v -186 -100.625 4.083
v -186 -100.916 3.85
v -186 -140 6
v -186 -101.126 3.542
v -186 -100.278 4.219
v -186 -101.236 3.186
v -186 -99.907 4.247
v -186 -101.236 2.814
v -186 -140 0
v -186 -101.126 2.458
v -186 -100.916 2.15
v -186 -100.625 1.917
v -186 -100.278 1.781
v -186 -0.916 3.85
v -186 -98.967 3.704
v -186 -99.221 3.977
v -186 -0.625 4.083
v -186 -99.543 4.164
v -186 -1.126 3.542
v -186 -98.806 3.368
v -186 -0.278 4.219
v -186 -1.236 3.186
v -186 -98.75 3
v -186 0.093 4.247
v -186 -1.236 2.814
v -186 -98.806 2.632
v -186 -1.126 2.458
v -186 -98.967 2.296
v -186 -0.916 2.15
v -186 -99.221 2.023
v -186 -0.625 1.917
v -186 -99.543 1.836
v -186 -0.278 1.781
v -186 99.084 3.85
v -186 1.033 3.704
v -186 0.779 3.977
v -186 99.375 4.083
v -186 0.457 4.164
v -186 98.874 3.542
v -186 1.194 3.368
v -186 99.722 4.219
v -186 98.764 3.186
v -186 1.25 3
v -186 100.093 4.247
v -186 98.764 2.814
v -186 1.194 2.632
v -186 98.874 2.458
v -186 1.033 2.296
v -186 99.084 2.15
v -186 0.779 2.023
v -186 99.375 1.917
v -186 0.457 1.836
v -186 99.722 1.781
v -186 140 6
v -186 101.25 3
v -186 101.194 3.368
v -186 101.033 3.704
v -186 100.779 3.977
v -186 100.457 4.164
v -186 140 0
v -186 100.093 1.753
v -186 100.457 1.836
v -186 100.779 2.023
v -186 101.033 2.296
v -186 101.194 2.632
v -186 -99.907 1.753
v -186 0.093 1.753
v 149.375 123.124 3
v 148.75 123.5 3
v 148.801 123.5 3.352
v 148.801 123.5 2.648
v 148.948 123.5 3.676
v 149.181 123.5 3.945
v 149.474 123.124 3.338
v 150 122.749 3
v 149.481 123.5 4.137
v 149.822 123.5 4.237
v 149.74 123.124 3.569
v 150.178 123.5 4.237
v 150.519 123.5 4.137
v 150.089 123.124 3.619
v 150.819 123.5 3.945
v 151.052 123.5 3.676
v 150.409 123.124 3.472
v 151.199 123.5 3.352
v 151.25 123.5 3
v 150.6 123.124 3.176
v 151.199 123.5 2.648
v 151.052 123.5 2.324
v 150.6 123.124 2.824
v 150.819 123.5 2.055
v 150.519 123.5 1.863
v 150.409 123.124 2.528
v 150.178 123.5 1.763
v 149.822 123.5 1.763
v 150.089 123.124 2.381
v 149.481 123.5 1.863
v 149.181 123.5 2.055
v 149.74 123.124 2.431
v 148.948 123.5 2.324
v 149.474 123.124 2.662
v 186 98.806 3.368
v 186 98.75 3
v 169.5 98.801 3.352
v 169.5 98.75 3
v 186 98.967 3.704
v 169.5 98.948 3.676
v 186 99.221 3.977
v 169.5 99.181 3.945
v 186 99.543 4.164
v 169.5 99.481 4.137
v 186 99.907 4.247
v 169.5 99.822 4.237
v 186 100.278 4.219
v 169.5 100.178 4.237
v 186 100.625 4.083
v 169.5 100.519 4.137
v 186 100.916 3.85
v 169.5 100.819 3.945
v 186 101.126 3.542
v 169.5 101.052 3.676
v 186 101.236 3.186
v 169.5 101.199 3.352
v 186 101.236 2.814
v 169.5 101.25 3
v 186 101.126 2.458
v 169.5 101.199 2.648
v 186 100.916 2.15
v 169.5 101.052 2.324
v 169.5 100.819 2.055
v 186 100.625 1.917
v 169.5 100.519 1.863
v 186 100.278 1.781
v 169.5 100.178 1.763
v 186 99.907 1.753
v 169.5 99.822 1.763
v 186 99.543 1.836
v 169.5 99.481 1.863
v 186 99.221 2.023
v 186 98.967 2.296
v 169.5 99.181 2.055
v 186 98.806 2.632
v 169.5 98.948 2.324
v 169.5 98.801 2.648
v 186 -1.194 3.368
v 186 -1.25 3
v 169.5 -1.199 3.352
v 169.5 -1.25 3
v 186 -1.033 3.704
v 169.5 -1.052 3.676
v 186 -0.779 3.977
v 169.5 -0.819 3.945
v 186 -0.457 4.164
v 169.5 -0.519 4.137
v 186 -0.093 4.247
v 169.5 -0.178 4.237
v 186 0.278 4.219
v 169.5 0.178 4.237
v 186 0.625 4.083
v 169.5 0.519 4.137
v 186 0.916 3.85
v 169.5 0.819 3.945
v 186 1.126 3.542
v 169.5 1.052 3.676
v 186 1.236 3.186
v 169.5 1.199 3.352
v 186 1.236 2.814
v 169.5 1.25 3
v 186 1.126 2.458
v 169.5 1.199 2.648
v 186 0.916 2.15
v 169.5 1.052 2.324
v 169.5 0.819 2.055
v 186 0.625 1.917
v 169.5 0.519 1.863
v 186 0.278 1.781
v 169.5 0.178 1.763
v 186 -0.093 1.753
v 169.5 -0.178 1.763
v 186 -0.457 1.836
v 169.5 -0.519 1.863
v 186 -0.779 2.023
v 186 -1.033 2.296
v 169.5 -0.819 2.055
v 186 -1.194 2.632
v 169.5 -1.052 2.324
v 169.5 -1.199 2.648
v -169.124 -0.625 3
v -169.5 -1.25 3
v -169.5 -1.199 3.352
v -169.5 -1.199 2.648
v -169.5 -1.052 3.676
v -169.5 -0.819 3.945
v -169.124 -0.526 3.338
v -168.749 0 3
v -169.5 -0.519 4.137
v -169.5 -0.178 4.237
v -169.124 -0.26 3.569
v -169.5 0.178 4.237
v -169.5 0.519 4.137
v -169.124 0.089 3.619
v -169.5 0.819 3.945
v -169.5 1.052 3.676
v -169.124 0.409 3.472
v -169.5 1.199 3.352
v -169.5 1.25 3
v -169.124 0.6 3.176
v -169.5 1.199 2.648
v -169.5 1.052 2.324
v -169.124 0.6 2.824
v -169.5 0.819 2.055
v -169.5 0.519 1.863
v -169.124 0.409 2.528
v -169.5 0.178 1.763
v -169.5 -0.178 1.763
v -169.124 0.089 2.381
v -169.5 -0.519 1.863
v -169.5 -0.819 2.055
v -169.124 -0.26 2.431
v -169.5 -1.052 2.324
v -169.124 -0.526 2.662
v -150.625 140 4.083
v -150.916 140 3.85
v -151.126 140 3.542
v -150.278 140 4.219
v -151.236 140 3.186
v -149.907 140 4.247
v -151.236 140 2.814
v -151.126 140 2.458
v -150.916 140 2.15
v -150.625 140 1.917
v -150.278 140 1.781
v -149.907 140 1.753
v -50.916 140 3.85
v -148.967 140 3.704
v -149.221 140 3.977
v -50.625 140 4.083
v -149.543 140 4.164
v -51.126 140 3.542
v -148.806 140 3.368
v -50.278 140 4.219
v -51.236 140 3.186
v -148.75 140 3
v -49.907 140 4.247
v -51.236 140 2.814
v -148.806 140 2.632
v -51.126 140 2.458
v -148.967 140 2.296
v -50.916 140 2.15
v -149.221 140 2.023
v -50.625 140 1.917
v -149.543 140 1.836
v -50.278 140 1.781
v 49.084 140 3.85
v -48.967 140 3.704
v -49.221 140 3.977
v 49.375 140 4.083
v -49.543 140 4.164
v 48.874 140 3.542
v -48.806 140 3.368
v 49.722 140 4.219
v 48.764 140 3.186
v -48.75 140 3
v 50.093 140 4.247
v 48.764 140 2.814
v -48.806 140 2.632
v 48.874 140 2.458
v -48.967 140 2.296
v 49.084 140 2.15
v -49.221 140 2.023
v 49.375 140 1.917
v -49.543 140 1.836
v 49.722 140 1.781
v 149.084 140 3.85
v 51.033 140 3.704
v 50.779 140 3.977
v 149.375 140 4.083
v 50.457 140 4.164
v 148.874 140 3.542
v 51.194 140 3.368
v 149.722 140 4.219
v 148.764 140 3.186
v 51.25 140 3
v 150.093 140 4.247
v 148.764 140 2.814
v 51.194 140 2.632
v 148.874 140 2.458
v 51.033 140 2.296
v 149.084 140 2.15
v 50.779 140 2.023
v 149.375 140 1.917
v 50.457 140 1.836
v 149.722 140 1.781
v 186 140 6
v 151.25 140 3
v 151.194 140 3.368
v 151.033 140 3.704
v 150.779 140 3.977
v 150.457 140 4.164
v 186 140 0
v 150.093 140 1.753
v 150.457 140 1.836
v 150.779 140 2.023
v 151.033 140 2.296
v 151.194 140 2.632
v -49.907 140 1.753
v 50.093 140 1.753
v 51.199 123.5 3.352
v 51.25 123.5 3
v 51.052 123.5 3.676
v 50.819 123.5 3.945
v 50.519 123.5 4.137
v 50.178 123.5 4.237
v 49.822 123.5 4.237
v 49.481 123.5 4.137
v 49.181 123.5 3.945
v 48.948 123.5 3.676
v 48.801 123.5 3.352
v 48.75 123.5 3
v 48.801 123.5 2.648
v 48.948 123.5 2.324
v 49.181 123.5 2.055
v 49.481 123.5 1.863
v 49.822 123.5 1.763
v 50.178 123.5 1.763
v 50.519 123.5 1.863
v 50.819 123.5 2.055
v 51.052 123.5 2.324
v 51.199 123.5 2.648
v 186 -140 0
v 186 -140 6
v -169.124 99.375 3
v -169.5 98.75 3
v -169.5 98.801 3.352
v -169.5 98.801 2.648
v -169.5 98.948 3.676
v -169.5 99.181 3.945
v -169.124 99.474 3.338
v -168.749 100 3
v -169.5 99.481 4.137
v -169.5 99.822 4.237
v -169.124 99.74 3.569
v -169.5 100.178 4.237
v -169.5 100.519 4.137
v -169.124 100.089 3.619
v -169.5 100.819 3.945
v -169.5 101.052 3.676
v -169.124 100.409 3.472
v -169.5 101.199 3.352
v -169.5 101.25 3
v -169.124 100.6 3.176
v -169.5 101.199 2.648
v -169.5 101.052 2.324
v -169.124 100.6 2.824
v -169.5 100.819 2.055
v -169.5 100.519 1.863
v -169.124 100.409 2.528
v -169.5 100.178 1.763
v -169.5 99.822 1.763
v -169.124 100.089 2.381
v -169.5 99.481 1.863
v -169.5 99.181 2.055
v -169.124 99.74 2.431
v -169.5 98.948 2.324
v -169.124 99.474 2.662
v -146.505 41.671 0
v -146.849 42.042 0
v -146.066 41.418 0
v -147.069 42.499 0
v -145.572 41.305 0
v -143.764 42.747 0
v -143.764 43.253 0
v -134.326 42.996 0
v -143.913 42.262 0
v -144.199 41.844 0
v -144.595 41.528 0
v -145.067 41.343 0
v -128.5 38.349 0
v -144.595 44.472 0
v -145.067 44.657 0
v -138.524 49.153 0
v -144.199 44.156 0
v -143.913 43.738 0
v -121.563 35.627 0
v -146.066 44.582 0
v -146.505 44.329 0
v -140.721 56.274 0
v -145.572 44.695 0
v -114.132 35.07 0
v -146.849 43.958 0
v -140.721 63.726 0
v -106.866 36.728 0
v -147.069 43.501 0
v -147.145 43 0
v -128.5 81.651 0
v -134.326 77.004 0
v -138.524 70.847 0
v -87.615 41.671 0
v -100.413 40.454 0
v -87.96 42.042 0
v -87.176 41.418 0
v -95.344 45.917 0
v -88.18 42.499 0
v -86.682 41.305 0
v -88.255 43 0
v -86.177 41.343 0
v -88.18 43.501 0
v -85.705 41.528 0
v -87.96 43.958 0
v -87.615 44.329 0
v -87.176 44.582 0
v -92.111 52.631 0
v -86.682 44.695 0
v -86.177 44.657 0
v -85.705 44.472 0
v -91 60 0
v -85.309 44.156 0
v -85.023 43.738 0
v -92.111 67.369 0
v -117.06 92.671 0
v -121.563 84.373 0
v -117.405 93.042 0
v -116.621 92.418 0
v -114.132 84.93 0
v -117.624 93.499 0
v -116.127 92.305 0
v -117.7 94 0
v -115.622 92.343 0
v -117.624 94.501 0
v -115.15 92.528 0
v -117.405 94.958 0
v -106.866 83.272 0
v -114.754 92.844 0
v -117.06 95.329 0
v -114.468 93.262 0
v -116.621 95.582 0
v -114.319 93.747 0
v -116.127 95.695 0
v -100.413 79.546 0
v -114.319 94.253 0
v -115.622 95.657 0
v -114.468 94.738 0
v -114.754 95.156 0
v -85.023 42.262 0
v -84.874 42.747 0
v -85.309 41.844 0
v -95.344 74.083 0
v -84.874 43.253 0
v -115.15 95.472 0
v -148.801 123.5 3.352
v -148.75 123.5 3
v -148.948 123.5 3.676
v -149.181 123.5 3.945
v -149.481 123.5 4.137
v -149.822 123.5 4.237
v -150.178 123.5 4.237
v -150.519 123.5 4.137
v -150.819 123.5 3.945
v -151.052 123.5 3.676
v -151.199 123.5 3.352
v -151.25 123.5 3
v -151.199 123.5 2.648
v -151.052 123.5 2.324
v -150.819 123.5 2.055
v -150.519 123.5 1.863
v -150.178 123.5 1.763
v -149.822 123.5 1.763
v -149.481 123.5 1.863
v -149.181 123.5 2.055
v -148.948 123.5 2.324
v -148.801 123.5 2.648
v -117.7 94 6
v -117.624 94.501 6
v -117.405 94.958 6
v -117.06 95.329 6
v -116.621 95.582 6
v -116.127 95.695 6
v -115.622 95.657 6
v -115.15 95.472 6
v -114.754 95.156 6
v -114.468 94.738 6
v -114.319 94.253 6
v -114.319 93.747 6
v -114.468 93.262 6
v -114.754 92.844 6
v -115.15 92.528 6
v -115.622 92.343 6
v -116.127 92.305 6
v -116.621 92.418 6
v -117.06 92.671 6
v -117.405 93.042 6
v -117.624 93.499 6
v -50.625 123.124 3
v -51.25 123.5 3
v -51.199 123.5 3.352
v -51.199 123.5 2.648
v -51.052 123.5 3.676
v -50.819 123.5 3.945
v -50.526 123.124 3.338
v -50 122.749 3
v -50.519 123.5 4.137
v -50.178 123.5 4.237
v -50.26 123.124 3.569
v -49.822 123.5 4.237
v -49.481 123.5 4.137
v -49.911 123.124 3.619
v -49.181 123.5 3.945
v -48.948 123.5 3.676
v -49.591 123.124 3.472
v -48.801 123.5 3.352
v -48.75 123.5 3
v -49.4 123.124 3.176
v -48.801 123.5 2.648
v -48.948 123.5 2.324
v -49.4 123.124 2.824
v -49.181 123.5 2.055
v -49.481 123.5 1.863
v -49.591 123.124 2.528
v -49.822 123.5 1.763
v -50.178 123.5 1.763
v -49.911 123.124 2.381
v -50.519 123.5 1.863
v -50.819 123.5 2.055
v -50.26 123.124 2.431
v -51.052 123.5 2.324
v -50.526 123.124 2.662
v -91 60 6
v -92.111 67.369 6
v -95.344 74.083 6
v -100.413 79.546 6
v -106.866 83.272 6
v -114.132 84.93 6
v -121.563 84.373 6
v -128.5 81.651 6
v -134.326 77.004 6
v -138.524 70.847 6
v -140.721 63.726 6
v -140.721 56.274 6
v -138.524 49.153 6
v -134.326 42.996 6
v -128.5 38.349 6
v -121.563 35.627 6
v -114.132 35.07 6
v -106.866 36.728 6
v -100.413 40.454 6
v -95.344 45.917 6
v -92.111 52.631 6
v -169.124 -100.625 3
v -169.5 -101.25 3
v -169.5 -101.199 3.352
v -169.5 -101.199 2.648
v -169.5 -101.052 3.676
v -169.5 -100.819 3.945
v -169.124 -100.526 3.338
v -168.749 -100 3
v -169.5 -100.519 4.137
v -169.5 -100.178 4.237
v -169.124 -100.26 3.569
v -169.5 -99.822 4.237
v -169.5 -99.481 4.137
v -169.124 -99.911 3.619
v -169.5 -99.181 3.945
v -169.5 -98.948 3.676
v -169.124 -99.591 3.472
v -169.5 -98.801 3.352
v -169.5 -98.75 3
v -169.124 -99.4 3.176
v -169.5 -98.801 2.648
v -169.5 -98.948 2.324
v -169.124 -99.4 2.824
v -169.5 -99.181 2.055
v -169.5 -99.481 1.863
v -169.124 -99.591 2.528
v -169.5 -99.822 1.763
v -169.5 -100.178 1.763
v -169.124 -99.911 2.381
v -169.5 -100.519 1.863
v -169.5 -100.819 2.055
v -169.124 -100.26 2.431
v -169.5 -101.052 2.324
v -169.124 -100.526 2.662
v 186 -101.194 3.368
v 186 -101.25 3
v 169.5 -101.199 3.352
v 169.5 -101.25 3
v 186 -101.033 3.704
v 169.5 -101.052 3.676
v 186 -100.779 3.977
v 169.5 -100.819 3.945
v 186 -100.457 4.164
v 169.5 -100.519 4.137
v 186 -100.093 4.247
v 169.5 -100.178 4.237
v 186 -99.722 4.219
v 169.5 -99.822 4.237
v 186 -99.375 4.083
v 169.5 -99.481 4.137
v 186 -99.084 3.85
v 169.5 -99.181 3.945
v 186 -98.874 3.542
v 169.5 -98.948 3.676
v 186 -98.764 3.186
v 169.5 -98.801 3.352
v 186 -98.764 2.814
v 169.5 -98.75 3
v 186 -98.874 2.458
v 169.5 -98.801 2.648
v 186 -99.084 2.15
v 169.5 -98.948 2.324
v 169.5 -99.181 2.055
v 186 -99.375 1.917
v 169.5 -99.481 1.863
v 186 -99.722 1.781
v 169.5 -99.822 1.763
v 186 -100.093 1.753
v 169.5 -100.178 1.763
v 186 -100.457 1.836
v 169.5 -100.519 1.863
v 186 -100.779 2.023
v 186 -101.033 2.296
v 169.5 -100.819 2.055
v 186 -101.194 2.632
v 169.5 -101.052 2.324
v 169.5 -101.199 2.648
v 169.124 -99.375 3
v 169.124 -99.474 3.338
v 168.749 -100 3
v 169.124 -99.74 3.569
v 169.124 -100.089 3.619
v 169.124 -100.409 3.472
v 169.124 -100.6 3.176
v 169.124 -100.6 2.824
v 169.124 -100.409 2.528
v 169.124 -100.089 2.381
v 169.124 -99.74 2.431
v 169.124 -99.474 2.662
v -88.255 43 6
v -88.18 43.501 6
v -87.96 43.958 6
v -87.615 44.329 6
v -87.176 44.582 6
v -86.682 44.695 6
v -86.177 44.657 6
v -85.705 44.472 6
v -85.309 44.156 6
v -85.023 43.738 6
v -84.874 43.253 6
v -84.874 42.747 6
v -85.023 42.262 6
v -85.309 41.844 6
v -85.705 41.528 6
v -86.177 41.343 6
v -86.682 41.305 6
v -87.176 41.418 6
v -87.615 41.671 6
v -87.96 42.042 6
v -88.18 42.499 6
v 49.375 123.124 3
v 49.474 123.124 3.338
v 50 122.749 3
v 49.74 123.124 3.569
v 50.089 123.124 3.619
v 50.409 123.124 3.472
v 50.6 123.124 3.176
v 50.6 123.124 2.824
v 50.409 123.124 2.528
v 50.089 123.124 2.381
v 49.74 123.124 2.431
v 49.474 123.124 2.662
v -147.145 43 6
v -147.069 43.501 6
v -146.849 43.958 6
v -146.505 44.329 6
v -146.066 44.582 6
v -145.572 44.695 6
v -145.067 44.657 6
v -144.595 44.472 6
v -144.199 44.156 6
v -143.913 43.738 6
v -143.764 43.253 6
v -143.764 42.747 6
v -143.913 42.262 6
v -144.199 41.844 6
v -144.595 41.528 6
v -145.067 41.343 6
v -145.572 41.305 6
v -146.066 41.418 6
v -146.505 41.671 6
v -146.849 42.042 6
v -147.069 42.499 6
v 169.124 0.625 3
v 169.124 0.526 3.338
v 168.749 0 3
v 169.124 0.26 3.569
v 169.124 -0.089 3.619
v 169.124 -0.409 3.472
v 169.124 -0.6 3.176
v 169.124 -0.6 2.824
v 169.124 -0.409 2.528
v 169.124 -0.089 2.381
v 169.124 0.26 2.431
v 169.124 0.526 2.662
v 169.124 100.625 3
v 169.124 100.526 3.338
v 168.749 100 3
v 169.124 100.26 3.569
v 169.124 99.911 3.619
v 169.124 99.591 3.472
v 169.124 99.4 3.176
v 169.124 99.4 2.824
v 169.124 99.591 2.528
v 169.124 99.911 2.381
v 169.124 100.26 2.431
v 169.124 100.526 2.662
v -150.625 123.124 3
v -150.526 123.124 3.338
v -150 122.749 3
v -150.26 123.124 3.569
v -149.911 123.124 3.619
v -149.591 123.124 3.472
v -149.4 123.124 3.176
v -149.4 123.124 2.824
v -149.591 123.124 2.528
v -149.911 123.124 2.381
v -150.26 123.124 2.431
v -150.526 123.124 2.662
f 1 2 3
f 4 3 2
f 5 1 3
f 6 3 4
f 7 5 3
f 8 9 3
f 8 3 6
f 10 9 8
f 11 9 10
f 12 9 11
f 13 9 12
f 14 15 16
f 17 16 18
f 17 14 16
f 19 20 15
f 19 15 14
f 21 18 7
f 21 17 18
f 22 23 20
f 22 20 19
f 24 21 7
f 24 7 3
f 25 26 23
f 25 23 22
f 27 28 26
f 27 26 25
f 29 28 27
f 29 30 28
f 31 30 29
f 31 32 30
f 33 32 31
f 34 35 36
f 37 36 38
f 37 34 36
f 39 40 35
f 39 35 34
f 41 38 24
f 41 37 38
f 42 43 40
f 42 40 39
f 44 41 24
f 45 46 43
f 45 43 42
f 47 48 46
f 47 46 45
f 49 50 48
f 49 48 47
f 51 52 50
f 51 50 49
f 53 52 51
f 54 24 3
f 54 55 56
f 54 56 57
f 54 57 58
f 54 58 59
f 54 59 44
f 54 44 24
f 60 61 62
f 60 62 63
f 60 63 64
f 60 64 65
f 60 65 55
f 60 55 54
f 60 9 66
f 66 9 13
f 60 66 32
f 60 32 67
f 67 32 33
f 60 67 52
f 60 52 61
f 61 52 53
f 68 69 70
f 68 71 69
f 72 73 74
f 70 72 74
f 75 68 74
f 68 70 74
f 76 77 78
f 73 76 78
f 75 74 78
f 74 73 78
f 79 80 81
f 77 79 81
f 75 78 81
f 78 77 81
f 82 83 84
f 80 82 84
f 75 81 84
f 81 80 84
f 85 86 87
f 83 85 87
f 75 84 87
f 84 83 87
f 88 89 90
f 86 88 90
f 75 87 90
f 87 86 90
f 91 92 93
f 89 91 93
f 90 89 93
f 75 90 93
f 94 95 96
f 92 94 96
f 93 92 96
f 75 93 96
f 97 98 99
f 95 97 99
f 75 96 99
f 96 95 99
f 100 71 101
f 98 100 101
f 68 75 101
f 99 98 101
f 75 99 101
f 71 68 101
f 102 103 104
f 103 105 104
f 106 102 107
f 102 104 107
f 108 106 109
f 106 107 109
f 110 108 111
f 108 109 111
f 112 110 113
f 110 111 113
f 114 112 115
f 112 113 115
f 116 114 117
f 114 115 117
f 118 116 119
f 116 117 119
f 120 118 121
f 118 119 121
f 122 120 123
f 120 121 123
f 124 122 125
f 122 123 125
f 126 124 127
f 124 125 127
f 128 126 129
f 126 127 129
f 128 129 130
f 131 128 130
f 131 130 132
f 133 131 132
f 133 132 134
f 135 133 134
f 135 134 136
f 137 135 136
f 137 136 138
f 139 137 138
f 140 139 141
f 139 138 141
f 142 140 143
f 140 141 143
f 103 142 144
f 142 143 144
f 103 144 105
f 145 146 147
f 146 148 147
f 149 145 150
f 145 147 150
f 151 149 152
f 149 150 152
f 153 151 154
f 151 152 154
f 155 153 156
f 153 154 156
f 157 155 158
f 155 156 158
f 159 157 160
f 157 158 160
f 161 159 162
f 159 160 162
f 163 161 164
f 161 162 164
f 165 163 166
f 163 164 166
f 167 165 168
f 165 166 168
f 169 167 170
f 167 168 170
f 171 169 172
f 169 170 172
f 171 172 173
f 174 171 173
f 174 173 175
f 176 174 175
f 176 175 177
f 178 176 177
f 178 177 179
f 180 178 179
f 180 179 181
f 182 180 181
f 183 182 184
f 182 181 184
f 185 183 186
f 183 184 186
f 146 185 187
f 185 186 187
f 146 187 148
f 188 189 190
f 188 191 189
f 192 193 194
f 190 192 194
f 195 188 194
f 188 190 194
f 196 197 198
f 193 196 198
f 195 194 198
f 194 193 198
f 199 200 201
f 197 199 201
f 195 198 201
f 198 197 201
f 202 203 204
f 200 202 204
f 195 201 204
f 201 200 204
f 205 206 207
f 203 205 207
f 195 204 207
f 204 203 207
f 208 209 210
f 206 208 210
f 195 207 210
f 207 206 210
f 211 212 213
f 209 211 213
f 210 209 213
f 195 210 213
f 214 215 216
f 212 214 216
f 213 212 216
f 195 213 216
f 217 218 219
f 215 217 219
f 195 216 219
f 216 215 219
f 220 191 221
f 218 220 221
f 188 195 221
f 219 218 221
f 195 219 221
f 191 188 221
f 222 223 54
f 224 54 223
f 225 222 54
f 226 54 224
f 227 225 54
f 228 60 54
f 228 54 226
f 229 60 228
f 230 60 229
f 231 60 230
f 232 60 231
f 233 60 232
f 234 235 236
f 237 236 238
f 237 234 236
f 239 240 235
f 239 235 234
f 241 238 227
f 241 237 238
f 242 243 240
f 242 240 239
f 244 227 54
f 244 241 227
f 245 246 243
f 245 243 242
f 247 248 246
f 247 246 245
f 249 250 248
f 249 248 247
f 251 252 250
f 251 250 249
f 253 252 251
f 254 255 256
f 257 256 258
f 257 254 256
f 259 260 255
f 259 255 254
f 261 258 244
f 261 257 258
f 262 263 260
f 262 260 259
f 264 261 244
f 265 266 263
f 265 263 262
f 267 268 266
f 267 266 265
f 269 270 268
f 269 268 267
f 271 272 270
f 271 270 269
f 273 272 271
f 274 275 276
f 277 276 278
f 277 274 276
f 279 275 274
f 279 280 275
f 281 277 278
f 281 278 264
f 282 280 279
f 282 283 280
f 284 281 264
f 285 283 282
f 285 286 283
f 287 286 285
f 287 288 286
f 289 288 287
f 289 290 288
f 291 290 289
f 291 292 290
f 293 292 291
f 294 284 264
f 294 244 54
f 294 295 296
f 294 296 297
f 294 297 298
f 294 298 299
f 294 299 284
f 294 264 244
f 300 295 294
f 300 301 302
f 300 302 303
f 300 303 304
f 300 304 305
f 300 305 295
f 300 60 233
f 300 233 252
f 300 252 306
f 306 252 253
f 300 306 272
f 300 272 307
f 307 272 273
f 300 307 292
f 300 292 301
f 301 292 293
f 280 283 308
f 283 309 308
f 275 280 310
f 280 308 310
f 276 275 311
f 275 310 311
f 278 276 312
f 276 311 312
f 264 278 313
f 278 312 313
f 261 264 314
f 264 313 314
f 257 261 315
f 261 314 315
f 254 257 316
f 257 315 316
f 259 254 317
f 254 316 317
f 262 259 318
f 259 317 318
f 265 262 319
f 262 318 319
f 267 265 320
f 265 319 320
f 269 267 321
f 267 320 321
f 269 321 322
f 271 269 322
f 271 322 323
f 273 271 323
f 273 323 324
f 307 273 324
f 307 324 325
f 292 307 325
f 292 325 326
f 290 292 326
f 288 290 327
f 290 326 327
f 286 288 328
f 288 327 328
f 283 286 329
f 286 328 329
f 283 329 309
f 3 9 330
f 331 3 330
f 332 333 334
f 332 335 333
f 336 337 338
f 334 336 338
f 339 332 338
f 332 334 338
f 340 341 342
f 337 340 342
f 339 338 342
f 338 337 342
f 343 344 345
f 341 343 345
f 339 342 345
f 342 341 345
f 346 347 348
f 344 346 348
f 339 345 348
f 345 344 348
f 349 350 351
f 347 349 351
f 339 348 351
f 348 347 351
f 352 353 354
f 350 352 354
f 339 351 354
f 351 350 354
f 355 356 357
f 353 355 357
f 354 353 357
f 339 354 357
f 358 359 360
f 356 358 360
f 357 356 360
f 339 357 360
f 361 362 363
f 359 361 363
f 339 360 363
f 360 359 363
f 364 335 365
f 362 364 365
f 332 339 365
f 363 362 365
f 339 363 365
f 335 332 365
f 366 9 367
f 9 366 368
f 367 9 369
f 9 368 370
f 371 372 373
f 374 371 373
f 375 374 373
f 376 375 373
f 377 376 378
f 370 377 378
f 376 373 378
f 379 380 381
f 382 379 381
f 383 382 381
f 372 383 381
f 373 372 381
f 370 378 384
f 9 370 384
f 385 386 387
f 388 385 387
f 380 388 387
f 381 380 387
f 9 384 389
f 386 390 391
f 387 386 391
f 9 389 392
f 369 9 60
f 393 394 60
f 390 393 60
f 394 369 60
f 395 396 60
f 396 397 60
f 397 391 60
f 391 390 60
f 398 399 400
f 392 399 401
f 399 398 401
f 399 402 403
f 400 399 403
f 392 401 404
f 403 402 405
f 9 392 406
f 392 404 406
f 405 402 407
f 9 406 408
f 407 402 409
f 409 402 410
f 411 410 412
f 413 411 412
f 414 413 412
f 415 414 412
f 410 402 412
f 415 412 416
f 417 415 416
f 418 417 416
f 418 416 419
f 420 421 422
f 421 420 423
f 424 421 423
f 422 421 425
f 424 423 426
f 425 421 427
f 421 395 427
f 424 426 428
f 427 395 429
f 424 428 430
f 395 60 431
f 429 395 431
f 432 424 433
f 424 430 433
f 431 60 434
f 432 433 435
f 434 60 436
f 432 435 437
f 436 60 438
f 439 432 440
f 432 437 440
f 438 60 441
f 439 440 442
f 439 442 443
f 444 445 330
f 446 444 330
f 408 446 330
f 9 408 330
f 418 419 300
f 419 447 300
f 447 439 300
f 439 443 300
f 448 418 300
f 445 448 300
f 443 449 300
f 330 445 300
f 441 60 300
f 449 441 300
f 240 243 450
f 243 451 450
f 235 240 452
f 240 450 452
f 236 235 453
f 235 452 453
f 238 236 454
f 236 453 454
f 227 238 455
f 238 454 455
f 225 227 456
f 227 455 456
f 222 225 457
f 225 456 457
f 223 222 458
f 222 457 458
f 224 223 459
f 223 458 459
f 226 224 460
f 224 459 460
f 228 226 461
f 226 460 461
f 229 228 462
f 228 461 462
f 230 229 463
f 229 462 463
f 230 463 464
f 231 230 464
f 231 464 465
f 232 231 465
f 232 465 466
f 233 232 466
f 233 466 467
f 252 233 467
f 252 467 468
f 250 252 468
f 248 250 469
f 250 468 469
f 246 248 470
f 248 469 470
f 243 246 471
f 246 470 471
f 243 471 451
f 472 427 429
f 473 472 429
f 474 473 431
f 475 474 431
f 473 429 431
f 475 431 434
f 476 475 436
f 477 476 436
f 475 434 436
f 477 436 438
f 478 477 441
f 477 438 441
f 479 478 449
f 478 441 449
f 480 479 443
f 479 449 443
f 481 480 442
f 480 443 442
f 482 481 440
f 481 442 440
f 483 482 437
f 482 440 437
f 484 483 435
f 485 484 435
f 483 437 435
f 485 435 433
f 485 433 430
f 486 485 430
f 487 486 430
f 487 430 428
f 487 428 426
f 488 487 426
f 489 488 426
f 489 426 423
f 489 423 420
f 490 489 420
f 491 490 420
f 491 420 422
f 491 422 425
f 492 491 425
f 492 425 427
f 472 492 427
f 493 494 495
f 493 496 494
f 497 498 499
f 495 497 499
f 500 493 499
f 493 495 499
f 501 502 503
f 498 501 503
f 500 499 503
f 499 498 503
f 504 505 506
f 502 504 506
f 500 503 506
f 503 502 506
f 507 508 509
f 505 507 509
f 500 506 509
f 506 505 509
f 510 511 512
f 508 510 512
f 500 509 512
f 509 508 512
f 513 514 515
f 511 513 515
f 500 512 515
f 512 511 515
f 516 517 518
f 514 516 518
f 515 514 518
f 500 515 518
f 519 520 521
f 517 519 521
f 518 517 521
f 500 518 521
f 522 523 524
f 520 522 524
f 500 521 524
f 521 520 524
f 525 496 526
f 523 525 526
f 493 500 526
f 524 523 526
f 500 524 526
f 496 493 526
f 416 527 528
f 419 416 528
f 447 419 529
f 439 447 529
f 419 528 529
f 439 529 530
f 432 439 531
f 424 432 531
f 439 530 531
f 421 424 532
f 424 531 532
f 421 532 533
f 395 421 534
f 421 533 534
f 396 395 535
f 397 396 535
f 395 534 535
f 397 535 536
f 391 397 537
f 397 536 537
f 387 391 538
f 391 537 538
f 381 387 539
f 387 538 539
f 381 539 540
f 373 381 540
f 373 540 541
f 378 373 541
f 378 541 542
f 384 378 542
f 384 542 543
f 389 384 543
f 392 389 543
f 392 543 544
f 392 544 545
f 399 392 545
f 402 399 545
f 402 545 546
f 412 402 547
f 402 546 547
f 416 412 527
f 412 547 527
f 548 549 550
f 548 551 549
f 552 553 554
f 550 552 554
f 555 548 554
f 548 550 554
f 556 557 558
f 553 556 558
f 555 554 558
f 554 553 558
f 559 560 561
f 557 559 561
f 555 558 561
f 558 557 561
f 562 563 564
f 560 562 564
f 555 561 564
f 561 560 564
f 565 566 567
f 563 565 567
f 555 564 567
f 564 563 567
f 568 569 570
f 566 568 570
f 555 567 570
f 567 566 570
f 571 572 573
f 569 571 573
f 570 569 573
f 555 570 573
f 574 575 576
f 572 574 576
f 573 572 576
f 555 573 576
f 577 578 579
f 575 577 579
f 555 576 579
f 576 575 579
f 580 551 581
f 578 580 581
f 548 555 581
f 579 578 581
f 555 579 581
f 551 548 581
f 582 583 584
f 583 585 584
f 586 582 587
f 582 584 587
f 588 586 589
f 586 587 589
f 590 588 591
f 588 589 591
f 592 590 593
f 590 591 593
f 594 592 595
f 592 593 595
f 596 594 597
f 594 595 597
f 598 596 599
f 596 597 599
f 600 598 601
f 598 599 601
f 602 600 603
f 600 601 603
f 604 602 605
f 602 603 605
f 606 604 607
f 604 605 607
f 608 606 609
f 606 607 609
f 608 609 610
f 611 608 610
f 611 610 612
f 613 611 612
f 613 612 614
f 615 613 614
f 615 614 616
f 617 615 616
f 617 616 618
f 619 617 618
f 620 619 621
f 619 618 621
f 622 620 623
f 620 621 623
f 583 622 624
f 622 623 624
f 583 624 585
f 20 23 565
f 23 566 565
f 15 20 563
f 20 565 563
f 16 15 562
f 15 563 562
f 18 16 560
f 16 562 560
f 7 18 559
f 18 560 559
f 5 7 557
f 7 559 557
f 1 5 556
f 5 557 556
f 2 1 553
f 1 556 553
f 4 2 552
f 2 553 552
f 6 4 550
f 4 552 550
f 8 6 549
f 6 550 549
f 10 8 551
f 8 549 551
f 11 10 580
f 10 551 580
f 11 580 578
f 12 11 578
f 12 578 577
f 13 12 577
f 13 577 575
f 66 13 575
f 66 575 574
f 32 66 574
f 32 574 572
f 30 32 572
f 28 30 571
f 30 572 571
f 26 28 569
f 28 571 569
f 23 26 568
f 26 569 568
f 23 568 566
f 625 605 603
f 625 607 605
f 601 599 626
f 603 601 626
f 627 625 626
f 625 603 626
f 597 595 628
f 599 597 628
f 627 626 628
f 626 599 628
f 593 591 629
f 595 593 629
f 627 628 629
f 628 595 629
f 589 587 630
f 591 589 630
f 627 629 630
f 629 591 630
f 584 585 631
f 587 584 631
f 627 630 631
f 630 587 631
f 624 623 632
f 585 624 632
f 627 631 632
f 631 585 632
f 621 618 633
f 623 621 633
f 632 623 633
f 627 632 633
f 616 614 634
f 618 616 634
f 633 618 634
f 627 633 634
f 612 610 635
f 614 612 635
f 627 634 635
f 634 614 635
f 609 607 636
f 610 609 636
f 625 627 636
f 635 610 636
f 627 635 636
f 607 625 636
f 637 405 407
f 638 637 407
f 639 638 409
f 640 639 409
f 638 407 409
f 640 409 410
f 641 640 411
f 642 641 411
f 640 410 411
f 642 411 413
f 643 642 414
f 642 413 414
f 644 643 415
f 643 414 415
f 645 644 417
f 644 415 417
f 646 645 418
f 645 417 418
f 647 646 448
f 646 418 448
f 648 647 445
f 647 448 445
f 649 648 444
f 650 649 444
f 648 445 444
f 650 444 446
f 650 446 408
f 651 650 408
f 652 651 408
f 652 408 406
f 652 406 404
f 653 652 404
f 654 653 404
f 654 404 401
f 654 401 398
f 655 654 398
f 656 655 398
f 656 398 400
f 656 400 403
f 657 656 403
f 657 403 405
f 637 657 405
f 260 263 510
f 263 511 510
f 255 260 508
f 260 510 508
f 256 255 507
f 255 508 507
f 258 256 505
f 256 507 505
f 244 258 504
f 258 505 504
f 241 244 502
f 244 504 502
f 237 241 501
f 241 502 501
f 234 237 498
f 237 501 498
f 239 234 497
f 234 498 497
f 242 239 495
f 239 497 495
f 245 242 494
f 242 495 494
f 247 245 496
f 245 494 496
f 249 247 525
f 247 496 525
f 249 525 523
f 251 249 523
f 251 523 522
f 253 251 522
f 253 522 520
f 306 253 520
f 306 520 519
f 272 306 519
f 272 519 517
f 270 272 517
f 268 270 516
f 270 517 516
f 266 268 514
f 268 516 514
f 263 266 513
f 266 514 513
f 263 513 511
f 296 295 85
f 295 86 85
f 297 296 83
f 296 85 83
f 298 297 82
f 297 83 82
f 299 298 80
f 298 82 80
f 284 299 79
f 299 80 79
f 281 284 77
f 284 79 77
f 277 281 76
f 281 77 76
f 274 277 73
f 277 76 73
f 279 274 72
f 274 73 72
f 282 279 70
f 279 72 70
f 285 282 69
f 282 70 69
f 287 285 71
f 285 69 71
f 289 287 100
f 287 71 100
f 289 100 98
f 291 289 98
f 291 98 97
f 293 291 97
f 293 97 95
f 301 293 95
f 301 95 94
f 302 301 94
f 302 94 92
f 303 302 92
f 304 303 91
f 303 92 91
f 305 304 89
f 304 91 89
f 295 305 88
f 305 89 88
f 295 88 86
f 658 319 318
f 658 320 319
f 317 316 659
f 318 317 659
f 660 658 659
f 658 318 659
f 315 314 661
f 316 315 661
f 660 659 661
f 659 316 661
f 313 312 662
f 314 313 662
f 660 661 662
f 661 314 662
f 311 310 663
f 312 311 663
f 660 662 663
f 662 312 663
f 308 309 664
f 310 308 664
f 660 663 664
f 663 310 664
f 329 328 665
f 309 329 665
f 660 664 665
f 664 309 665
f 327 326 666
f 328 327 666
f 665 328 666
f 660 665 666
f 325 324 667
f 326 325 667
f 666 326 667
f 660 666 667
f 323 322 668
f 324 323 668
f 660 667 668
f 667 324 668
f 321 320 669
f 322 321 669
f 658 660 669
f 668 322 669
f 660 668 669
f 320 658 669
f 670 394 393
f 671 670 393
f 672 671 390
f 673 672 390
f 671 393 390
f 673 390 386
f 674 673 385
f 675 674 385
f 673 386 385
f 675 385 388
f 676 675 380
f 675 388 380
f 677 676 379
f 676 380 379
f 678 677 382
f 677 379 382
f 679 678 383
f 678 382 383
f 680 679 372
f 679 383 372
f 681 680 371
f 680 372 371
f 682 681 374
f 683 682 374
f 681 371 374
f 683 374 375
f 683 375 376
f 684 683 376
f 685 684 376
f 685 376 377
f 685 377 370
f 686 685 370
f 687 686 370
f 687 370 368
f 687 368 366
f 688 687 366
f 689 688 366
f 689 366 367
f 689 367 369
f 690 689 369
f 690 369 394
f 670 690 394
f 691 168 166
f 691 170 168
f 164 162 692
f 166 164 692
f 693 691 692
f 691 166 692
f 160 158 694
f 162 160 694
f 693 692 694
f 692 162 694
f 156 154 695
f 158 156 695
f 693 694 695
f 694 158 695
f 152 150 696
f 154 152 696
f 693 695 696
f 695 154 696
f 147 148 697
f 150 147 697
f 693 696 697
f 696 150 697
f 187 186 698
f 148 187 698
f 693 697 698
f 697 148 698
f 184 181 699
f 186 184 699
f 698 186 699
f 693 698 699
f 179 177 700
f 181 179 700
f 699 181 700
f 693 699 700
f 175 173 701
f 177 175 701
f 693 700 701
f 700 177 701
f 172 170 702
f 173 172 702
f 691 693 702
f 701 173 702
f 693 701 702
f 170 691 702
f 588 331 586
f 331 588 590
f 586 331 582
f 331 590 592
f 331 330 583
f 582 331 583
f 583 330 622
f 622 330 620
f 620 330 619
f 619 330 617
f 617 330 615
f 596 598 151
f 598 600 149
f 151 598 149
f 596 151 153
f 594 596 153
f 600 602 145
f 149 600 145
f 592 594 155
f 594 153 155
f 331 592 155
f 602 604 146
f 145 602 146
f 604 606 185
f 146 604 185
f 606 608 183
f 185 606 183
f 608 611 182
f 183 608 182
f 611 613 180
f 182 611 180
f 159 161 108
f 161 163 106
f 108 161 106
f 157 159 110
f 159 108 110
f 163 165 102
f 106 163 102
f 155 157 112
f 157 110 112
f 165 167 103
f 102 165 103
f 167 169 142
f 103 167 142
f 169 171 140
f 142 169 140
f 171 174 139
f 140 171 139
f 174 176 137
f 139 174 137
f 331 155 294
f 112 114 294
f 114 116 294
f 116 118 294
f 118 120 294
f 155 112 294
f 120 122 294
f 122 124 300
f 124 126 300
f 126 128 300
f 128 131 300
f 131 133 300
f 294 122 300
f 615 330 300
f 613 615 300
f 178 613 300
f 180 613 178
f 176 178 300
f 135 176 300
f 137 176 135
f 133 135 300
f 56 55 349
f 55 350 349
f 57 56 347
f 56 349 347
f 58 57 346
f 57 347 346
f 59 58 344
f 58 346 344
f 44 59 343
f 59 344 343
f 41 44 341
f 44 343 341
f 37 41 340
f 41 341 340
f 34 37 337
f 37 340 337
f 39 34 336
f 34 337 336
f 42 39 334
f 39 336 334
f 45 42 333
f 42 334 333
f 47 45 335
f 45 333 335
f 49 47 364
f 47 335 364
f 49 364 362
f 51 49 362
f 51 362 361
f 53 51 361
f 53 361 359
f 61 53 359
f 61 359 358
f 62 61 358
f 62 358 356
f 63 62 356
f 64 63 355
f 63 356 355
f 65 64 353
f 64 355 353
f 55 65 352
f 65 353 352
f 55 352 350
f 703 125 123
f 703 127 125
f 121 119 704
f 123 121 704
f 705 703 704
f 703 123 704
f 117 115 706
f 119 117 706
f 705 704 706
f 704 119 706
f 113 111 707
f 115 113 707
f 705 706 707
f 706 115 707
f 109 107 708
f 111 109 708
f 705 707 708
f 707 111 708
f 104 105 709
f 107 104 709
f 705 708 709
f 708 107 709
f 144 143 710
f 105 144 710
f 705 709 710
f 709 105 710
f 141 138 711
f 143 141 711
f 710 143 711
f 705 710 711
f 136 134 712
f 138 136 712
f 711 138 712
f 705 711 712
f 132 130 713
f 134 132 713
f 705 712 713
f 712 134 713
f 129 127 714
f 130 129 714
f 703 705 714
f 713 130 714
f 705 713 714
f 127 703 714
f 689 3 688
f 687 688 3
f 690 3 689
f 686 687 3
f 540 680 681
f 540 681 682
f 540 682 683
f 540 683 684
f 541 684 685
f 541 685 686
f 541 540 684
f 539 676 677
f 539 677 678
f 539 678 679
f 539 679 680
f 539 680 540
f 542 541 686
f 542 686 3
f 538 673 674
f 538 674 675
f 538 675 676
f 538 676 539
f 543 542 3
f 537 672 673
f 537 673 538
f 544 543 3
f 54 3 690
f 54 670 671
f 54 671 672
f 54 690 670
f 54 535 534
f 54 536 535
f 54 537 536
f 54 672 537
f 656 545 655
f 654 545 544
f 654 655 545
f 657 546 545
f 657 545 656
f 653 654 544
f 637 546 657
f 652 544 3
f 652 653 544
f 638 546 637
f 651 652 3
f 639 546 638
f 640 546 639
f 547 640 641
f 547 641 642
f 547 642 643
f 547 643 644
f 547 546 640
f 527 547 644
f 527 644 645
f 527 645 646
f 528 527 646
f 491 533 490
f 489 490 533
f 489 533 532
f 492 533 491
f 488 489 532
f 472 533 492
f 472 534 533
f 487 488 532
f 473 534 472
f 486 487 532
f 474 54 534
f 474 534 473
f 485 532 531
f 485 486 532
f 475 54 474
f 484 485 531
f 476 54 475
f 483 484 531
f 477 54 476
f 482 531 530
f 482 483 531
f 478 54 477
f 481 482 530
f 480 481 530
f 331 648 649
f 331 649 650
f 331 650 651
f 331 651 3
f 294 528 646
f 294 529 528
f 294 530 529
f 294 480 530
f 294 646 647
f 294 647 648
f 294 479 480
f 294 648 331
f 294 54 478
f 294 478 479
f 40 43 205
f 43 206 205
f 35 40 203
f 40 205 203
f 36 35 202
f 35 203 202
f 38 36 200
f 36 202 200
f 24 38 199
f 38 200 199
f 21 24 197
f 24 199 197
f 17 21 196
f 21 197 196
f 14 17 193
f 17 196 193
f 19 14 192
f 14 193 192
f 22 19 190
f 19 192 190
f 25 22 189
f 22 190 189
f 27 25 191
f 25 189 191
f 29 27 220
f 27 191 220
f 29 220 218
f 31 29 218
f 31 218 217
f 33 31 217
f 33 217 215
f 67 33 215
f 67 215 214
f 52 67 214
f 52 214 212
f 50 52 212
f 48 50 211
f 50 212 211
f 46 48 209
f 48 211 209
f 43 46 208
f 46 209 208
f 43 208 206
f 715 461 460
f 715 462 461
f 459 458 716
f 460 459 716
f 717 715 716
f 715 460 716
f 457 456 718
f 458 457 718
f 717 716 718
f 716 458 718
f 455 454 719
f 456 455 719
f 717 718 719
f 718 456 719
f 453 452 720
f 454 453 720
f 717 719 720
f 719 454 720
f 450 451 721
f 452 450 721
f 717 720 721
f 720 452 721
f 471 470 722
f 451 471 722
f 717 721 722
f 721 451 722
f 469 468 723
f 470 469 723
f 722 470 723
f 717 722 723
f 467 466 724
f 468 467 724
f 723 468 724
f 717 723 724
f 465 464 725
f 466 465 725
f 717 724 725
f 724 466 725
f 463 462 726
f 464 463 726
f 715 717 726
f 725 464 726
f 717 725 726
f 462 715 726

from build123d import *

# Parameters (mm, degrees)
F0_W           = 372
F0_H           = 280
F1_DEPTH       = 6
F2_R           = 25
F3_DEPTH       = 6
F5_D           = 3.4
F9_D           = 2.5
F9_DEPTH       = 16.5
F9_TIP         = 0.7510757738
F9_ON_F8_D     = 2.5
F9_ON_F8_DEPTH = 16.5
F9_ON_F8_TIP   = 0.7510757738
F9_ON_F7_D     = 2.5
F9_ON_F7_DEPTH = 16.5
F9_ON_F7_TIP   = 0.7510757738
F10_D          = 2.5
F10_DEPTH      = 16.5
F10_TIP        = 0.7510757738


# Not quite as in the source:
# - a feature names something its author has since deleted; it is built from what else it names


with BuildPart() as f1:
    # F0 (on Top) → F1 (new body)
    with BuildSketch(Plane.XY):
        Rectangle(F0_W, F0_H)
    extrude(amount=F1_DEPTH)


with BuildPart() as f3:
    # F2 (on face) → F3 (new body)
    with BuildSketch(Plane.XY.offset(6)):
        with Locations((-116, 60)):
            Circle(F2_R)
    extrude(amount=-F3_DEPTH)


with BuildPart() as f1_1:
    add(f1.part)

    # F4: cut F3
    add(f3.part, mode=Mode.SUBTRACT)

    # F5 (through all)
    with Locations(Plane.XY.offset(6)):
        with Locations((-116, 94), (-145.4448637287, 43), (-86.5551362713, 43)):
            Hole(F5_D / 2)

    # F9
    with Locations(Plane.YZ.offset(186)):
        with Locations((-100, 3), (0, 3), (100, 3)):
            Hole(F9_D / 2, depth=F9_DEPTH)
            with Locations((0, 0, -(F9_DEPTH + F9_TIP / 2))):  # 118° drill point
                Cone(0, F9_D / 2, F9_TIP, mode=Mode.SUBTRACT)

    # F9 on F8
    with Locations(Plane(origin=(0, 140, 0), x_dir=(-1, 0, 0), z_dir=(0, 1, 0))):
        with Locations((-150, 3), (-50, 3), (50, 3)):
            Hole(F9_ON_F8_D / 2, depth=F9_ON_F8_DEPTH)
            with Locations((0, 0, -(F9_ON_F8_DEPTH + F9_ON_F8_TIP / 2))):  # 118° drill point
                Cone(0, F9_ON_F8_D / 2, F9_ON_F8_TIP, mode=Mode.SUBTRACT)

    # F9 on F7
    with Locations(Plane(origin=(-186, 0, 0), x_dir=(0, -1, 0), z_dir=(-1, 0, 0))):
        with Locations((-100, 3), (0, 3), (100, 3)):
            Hole(F9_ON_F7_D / 2, depth=F9_ON_F7_DEPTH)
            with Locations((0, 0, -(F9_ON_F7_DEPTH + F9_ON_F7_TIP / 2))):  # 118° drill point
                Cone(0, F9_ON_F7_D / 2, F9_ON_F7_TIP, mode=Mode.SUBTRACT)

    # F10
    with Locations(Plane(origin=(0, 140, 0), x_dir=(-1, 0, 0), z_dir=(0, 1, 0))):
        with Locations((150, 3)):
            Hole(F10_D / 2, depth=F10_DEPTH)
            with Locations((0, 0, -(F10_DEPTH + F10_TIP / 2))):  # 118° drill point
                Cone(0, F10_D / 2, F10_TIP, mode=Mode.SUBTRACT)


solid = f1_1.part
